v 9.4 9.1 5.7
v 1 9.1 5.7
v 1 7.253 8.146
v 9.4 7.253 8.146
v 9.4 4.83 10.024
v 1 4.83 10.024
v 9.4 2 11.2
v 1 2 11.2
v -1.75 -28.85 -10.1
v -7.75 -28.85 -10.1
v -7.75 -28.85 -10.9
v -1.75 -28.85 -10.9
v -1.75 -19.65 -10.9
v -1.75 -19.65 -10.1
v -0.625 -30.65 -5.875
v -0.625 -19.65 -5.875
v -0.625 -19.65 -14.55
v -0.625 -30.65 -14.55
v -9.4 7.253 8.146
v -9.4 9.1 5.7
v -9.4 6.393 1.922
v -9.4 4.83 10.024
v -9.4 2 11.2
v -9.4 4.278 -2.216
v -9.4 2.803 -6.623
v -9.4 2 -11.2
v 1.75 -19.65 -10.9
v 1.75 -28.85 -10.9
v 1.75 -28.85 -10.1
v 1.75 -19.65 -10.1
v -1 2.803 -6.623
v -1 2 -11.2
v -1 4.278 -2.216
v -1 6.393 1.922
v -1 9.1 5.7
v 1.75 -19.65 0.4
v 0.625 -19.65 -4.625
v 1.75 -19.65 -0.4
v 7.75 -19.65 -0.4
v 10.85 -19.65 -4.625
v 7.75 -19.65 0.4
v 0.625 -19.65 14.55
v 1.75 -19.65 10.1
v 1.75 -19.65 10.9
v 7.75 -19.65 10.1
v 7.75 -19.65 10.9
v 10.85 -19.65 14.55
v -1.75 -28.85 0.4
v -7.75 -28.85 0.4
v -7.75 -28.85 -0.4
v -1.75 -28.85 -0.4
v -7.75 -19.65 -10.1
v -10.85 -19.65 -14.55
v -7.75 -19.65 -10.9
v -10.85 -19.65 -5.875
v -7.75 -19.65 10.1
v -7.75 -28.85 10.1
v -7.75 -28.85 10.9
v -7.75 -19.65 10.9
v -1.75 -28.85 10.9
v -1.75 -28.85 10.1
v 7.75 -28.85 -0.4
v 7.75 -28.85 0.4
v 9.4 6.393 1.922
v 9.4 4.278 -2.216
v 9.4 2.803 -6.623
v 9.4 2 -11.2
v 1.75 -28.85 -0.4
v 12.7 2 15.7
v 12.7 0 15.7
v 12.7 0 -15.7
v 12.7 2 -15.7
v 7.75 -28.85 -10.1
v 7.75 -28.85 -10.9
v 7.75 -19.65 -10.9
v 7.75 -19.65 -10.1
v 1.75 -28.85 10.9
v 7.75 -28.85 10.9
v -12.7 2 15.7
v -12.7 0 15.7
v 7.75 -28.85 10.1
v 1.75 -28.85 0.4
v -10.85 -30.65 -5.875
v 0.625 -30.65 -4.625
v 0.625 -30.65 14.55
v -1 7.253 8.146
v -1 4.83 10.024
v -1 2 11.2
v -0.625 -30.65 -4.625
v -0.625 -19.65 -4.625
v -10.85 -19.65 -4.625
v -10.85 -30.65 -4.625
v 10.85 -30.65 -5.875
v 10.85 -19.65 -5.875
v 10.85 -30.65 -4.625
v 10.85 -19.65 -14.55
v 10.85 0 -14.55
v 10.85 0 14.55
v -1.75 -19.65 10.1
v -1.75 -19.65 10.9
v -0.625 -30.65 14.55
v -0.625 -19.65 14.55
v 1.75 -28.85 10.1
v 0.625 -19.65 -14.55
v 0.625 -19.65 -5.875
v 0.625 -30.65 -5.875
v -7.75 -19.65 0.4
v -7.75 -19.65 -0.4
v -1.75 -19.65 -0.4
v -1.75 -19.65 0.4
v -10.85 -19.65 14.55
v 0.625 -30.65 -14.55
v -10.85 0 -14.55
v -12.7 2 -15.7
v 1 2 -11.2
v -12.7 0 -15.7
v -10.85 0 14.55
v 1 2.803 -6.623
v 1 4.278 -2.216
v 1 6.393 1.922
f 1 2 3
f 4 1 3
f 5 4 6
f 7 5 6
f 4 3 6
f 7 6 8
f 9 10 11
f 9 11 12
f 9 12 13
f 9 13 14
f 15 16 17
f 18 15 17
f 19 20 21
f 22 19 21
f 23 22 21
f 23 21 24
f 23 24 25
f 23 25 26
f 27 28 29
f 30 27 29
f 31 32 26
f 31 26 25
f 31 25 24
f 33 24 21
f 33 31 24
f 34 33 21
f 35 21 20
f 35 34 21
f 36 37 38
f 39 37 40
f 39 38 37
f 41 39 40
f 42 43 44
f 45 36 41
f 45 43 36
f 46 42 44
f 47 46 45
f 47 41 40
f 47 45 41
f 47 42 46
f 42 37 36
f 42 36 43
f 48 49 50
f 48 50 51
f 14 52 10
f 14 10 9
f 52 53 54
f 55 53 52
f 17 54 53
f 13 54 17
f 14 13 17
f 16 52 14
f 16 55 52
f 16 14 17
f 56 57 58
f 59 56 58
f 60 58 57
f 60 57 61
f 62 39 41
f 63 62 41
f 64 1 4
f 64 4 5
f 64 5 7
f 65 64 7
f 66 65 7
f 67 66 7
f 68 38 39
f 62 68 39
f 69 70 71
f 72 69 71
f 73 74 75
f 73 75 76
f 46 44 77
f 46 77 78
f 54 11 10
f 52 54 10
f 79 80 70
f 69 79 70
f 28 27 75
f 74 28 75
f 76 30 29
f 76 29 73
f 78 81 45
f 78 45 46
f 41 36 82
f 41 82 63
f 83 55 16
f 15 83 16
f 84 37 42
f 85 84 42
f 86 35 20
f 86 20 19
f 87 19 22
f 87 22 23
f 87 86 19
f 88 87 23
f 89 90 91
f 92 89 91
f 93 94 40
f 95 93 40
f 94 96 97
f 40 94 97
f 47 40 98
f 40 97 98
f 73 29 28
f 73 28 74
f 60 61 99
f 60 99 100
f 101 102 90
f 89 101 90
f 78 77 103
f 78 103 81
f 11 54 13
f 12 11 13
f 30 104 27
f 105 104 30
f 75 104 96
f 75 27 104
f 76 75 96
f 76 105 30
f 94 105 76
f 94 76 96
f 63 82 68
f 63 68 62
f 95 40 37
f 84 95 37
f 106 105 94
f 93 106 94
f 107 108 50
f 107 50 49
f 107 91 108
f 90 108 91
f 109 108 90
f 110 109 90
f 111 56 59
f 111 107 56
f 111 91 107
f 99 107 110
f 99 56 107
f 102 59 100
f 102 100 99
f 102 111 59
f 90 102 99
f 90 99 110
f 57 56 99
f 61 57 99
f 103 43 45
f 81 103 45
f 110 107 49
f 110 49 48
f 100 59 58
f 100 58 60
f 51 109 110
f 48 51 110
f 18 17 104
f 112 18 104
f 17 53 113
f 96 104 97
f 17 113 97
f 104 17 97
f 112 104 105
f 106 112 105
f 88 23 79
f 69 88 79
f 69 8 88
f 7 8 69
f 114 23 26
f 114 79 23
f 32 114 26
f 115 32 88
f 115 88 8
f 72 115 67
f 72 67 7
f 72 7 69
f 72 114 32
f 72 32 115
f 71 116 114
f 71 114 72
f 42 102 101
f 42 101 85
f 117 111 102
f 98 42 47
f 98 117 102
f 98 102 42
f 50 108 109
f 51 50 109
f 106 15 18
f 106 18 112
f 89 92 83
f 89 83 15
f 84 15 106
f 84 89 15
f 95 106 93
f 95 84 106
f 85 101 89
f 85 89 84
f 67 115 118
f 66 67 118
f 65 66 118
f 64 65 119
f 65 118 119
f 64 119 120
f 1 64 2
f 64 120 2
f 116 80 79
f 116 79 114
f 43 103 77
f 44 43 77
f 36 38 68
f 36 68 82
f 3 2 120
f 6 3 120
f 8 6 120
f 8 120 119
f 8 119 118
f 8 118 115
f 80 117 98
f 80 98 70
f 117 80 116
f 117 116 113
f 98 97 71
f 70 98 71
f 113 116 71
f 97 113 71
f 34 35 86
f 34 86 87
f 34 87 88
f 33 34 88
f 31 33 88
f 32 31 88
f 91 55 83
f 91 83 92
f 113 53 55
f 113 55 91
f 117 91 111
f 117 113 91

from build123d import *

# Parameters (mm, degrees)
CROQUIS1_W              = 25.4
CROQUIS1_H              = 31.4
SALIENTE_EXTRUIR1_DEPTH = 2
SALIENTE_EXTRUIR2_START = 1
SALIENTE_EXTRUIR2_DEPTH = 8.4
CROQUIS3_W              = 21.7
CROQUIS3_H              = 29.1
SALIENTE_EXTRUIR3_DEPTH = 19.65
CROQUIS4_W              = 6
CROQUIS4_H              = 0.8
SALIENTE_EXTRUIR4_DEPTH = 9.2
SALIENTE_EXTRUIR5_DEPTH = 11


with BuildPart() as part:
    # Croquis1 → Saliente-Extruir1 (new body)
    with BuildSketch(Plane(origin=(0, 0, 0), x_dir=(1, 0, 0), z_dir=(0, 1, 0))):
        Rectangle(CROQUIS1_W, CROQUIS1_H)
    extrude(amount=SALIENTE_EXTRUIR1_DEPTH)

    # Croquis2 → Saliente-Extruir2 (add)
    with BuildSketch(Plane(origin=(0, 0, 0), x_dir=(0, 0, -1), z_dir=(1, 0, 0)).offset(SALIENTE_EXTRUIR2_START)):
        with BuildLine():
            Line((-11.2, 2), (11.2, 2))
            ThreePointArc((11.2, 2), (2.215809273, 4.278475594), (-5.7, 9.1))
            ThreePointArc((-5.7, 9.1), (-9.165424158, 6.104201813), (-11.2, 2))
        make_face()
    saliente_extruir2 = extrude(amount=SALIENTE_EXTRUIR2_DEPTH)

    # Simetría1: Saliente-Extruir2 across plane
    add(saliente_extruir2.mirror(Plane(origin=(0, 0, 0), x_dir=(0, 0, 1), z_dir=(1, 0, 0))))

    # Croquis3 → Saliente-Extruir3 (add)
    with BuildSketch(Plane.XZ):
        Rectangle(CROQUIS3_W, CROQUIS3_H)
    extrude(amount=SALIENTE_EXTRUIR3_DEPTH)

    # Croquis4 → Saliente-Extruir4 (add)
    with BuildSketch(Plane.XZ.offset(19.65)):
        with Locations((4.75, 10.5)):
            Rectangle(CROQUIS4_W, CROQUIS4_H)
        with Locations((-4.75, 10.5)):
            Rectangle(CROQUIS4_W, CROQUIS4_H)
        with Locations((4.75, 0)):
            Rectangle(CROQUIS4_W, CROQUIS4_H)
        with Locations((4.75, -10.5)):
            Rectangle(CROQUIS4_W, CROQUIS4_H)
        with Locations((-4.75, 0)):
            Rectangle(CROQUIS4_W, CROQUIS4_H)
        with Locations((-4.75, -10.5)):
            Rectangle(CROQUIS4_W, CROQUIS4_H)
    extrude(amount=SALIENTE_EXTRUIR4_DEPTH)

    # Croquis5 → Saliente-Extruir5 (add)
    with BuildSketch(Plane.XZ.offset(19.65)):
        Polygon((0.625, 14.55), (-0.625, 14.55), (-0.625, -4.625), (-10.85, -4.625), (-10.85, -5.875), (-0.625, -5.875), (-0.625, -14.55), (0.625, -14.55), (0.625, -5.875), (10.85, -5.875), (10.85, -4.625), (0.625, -4.625), align=None)
    extrude(amount=SALIENTE_EXTRUIR5_DEPTH)


solid = part.part
